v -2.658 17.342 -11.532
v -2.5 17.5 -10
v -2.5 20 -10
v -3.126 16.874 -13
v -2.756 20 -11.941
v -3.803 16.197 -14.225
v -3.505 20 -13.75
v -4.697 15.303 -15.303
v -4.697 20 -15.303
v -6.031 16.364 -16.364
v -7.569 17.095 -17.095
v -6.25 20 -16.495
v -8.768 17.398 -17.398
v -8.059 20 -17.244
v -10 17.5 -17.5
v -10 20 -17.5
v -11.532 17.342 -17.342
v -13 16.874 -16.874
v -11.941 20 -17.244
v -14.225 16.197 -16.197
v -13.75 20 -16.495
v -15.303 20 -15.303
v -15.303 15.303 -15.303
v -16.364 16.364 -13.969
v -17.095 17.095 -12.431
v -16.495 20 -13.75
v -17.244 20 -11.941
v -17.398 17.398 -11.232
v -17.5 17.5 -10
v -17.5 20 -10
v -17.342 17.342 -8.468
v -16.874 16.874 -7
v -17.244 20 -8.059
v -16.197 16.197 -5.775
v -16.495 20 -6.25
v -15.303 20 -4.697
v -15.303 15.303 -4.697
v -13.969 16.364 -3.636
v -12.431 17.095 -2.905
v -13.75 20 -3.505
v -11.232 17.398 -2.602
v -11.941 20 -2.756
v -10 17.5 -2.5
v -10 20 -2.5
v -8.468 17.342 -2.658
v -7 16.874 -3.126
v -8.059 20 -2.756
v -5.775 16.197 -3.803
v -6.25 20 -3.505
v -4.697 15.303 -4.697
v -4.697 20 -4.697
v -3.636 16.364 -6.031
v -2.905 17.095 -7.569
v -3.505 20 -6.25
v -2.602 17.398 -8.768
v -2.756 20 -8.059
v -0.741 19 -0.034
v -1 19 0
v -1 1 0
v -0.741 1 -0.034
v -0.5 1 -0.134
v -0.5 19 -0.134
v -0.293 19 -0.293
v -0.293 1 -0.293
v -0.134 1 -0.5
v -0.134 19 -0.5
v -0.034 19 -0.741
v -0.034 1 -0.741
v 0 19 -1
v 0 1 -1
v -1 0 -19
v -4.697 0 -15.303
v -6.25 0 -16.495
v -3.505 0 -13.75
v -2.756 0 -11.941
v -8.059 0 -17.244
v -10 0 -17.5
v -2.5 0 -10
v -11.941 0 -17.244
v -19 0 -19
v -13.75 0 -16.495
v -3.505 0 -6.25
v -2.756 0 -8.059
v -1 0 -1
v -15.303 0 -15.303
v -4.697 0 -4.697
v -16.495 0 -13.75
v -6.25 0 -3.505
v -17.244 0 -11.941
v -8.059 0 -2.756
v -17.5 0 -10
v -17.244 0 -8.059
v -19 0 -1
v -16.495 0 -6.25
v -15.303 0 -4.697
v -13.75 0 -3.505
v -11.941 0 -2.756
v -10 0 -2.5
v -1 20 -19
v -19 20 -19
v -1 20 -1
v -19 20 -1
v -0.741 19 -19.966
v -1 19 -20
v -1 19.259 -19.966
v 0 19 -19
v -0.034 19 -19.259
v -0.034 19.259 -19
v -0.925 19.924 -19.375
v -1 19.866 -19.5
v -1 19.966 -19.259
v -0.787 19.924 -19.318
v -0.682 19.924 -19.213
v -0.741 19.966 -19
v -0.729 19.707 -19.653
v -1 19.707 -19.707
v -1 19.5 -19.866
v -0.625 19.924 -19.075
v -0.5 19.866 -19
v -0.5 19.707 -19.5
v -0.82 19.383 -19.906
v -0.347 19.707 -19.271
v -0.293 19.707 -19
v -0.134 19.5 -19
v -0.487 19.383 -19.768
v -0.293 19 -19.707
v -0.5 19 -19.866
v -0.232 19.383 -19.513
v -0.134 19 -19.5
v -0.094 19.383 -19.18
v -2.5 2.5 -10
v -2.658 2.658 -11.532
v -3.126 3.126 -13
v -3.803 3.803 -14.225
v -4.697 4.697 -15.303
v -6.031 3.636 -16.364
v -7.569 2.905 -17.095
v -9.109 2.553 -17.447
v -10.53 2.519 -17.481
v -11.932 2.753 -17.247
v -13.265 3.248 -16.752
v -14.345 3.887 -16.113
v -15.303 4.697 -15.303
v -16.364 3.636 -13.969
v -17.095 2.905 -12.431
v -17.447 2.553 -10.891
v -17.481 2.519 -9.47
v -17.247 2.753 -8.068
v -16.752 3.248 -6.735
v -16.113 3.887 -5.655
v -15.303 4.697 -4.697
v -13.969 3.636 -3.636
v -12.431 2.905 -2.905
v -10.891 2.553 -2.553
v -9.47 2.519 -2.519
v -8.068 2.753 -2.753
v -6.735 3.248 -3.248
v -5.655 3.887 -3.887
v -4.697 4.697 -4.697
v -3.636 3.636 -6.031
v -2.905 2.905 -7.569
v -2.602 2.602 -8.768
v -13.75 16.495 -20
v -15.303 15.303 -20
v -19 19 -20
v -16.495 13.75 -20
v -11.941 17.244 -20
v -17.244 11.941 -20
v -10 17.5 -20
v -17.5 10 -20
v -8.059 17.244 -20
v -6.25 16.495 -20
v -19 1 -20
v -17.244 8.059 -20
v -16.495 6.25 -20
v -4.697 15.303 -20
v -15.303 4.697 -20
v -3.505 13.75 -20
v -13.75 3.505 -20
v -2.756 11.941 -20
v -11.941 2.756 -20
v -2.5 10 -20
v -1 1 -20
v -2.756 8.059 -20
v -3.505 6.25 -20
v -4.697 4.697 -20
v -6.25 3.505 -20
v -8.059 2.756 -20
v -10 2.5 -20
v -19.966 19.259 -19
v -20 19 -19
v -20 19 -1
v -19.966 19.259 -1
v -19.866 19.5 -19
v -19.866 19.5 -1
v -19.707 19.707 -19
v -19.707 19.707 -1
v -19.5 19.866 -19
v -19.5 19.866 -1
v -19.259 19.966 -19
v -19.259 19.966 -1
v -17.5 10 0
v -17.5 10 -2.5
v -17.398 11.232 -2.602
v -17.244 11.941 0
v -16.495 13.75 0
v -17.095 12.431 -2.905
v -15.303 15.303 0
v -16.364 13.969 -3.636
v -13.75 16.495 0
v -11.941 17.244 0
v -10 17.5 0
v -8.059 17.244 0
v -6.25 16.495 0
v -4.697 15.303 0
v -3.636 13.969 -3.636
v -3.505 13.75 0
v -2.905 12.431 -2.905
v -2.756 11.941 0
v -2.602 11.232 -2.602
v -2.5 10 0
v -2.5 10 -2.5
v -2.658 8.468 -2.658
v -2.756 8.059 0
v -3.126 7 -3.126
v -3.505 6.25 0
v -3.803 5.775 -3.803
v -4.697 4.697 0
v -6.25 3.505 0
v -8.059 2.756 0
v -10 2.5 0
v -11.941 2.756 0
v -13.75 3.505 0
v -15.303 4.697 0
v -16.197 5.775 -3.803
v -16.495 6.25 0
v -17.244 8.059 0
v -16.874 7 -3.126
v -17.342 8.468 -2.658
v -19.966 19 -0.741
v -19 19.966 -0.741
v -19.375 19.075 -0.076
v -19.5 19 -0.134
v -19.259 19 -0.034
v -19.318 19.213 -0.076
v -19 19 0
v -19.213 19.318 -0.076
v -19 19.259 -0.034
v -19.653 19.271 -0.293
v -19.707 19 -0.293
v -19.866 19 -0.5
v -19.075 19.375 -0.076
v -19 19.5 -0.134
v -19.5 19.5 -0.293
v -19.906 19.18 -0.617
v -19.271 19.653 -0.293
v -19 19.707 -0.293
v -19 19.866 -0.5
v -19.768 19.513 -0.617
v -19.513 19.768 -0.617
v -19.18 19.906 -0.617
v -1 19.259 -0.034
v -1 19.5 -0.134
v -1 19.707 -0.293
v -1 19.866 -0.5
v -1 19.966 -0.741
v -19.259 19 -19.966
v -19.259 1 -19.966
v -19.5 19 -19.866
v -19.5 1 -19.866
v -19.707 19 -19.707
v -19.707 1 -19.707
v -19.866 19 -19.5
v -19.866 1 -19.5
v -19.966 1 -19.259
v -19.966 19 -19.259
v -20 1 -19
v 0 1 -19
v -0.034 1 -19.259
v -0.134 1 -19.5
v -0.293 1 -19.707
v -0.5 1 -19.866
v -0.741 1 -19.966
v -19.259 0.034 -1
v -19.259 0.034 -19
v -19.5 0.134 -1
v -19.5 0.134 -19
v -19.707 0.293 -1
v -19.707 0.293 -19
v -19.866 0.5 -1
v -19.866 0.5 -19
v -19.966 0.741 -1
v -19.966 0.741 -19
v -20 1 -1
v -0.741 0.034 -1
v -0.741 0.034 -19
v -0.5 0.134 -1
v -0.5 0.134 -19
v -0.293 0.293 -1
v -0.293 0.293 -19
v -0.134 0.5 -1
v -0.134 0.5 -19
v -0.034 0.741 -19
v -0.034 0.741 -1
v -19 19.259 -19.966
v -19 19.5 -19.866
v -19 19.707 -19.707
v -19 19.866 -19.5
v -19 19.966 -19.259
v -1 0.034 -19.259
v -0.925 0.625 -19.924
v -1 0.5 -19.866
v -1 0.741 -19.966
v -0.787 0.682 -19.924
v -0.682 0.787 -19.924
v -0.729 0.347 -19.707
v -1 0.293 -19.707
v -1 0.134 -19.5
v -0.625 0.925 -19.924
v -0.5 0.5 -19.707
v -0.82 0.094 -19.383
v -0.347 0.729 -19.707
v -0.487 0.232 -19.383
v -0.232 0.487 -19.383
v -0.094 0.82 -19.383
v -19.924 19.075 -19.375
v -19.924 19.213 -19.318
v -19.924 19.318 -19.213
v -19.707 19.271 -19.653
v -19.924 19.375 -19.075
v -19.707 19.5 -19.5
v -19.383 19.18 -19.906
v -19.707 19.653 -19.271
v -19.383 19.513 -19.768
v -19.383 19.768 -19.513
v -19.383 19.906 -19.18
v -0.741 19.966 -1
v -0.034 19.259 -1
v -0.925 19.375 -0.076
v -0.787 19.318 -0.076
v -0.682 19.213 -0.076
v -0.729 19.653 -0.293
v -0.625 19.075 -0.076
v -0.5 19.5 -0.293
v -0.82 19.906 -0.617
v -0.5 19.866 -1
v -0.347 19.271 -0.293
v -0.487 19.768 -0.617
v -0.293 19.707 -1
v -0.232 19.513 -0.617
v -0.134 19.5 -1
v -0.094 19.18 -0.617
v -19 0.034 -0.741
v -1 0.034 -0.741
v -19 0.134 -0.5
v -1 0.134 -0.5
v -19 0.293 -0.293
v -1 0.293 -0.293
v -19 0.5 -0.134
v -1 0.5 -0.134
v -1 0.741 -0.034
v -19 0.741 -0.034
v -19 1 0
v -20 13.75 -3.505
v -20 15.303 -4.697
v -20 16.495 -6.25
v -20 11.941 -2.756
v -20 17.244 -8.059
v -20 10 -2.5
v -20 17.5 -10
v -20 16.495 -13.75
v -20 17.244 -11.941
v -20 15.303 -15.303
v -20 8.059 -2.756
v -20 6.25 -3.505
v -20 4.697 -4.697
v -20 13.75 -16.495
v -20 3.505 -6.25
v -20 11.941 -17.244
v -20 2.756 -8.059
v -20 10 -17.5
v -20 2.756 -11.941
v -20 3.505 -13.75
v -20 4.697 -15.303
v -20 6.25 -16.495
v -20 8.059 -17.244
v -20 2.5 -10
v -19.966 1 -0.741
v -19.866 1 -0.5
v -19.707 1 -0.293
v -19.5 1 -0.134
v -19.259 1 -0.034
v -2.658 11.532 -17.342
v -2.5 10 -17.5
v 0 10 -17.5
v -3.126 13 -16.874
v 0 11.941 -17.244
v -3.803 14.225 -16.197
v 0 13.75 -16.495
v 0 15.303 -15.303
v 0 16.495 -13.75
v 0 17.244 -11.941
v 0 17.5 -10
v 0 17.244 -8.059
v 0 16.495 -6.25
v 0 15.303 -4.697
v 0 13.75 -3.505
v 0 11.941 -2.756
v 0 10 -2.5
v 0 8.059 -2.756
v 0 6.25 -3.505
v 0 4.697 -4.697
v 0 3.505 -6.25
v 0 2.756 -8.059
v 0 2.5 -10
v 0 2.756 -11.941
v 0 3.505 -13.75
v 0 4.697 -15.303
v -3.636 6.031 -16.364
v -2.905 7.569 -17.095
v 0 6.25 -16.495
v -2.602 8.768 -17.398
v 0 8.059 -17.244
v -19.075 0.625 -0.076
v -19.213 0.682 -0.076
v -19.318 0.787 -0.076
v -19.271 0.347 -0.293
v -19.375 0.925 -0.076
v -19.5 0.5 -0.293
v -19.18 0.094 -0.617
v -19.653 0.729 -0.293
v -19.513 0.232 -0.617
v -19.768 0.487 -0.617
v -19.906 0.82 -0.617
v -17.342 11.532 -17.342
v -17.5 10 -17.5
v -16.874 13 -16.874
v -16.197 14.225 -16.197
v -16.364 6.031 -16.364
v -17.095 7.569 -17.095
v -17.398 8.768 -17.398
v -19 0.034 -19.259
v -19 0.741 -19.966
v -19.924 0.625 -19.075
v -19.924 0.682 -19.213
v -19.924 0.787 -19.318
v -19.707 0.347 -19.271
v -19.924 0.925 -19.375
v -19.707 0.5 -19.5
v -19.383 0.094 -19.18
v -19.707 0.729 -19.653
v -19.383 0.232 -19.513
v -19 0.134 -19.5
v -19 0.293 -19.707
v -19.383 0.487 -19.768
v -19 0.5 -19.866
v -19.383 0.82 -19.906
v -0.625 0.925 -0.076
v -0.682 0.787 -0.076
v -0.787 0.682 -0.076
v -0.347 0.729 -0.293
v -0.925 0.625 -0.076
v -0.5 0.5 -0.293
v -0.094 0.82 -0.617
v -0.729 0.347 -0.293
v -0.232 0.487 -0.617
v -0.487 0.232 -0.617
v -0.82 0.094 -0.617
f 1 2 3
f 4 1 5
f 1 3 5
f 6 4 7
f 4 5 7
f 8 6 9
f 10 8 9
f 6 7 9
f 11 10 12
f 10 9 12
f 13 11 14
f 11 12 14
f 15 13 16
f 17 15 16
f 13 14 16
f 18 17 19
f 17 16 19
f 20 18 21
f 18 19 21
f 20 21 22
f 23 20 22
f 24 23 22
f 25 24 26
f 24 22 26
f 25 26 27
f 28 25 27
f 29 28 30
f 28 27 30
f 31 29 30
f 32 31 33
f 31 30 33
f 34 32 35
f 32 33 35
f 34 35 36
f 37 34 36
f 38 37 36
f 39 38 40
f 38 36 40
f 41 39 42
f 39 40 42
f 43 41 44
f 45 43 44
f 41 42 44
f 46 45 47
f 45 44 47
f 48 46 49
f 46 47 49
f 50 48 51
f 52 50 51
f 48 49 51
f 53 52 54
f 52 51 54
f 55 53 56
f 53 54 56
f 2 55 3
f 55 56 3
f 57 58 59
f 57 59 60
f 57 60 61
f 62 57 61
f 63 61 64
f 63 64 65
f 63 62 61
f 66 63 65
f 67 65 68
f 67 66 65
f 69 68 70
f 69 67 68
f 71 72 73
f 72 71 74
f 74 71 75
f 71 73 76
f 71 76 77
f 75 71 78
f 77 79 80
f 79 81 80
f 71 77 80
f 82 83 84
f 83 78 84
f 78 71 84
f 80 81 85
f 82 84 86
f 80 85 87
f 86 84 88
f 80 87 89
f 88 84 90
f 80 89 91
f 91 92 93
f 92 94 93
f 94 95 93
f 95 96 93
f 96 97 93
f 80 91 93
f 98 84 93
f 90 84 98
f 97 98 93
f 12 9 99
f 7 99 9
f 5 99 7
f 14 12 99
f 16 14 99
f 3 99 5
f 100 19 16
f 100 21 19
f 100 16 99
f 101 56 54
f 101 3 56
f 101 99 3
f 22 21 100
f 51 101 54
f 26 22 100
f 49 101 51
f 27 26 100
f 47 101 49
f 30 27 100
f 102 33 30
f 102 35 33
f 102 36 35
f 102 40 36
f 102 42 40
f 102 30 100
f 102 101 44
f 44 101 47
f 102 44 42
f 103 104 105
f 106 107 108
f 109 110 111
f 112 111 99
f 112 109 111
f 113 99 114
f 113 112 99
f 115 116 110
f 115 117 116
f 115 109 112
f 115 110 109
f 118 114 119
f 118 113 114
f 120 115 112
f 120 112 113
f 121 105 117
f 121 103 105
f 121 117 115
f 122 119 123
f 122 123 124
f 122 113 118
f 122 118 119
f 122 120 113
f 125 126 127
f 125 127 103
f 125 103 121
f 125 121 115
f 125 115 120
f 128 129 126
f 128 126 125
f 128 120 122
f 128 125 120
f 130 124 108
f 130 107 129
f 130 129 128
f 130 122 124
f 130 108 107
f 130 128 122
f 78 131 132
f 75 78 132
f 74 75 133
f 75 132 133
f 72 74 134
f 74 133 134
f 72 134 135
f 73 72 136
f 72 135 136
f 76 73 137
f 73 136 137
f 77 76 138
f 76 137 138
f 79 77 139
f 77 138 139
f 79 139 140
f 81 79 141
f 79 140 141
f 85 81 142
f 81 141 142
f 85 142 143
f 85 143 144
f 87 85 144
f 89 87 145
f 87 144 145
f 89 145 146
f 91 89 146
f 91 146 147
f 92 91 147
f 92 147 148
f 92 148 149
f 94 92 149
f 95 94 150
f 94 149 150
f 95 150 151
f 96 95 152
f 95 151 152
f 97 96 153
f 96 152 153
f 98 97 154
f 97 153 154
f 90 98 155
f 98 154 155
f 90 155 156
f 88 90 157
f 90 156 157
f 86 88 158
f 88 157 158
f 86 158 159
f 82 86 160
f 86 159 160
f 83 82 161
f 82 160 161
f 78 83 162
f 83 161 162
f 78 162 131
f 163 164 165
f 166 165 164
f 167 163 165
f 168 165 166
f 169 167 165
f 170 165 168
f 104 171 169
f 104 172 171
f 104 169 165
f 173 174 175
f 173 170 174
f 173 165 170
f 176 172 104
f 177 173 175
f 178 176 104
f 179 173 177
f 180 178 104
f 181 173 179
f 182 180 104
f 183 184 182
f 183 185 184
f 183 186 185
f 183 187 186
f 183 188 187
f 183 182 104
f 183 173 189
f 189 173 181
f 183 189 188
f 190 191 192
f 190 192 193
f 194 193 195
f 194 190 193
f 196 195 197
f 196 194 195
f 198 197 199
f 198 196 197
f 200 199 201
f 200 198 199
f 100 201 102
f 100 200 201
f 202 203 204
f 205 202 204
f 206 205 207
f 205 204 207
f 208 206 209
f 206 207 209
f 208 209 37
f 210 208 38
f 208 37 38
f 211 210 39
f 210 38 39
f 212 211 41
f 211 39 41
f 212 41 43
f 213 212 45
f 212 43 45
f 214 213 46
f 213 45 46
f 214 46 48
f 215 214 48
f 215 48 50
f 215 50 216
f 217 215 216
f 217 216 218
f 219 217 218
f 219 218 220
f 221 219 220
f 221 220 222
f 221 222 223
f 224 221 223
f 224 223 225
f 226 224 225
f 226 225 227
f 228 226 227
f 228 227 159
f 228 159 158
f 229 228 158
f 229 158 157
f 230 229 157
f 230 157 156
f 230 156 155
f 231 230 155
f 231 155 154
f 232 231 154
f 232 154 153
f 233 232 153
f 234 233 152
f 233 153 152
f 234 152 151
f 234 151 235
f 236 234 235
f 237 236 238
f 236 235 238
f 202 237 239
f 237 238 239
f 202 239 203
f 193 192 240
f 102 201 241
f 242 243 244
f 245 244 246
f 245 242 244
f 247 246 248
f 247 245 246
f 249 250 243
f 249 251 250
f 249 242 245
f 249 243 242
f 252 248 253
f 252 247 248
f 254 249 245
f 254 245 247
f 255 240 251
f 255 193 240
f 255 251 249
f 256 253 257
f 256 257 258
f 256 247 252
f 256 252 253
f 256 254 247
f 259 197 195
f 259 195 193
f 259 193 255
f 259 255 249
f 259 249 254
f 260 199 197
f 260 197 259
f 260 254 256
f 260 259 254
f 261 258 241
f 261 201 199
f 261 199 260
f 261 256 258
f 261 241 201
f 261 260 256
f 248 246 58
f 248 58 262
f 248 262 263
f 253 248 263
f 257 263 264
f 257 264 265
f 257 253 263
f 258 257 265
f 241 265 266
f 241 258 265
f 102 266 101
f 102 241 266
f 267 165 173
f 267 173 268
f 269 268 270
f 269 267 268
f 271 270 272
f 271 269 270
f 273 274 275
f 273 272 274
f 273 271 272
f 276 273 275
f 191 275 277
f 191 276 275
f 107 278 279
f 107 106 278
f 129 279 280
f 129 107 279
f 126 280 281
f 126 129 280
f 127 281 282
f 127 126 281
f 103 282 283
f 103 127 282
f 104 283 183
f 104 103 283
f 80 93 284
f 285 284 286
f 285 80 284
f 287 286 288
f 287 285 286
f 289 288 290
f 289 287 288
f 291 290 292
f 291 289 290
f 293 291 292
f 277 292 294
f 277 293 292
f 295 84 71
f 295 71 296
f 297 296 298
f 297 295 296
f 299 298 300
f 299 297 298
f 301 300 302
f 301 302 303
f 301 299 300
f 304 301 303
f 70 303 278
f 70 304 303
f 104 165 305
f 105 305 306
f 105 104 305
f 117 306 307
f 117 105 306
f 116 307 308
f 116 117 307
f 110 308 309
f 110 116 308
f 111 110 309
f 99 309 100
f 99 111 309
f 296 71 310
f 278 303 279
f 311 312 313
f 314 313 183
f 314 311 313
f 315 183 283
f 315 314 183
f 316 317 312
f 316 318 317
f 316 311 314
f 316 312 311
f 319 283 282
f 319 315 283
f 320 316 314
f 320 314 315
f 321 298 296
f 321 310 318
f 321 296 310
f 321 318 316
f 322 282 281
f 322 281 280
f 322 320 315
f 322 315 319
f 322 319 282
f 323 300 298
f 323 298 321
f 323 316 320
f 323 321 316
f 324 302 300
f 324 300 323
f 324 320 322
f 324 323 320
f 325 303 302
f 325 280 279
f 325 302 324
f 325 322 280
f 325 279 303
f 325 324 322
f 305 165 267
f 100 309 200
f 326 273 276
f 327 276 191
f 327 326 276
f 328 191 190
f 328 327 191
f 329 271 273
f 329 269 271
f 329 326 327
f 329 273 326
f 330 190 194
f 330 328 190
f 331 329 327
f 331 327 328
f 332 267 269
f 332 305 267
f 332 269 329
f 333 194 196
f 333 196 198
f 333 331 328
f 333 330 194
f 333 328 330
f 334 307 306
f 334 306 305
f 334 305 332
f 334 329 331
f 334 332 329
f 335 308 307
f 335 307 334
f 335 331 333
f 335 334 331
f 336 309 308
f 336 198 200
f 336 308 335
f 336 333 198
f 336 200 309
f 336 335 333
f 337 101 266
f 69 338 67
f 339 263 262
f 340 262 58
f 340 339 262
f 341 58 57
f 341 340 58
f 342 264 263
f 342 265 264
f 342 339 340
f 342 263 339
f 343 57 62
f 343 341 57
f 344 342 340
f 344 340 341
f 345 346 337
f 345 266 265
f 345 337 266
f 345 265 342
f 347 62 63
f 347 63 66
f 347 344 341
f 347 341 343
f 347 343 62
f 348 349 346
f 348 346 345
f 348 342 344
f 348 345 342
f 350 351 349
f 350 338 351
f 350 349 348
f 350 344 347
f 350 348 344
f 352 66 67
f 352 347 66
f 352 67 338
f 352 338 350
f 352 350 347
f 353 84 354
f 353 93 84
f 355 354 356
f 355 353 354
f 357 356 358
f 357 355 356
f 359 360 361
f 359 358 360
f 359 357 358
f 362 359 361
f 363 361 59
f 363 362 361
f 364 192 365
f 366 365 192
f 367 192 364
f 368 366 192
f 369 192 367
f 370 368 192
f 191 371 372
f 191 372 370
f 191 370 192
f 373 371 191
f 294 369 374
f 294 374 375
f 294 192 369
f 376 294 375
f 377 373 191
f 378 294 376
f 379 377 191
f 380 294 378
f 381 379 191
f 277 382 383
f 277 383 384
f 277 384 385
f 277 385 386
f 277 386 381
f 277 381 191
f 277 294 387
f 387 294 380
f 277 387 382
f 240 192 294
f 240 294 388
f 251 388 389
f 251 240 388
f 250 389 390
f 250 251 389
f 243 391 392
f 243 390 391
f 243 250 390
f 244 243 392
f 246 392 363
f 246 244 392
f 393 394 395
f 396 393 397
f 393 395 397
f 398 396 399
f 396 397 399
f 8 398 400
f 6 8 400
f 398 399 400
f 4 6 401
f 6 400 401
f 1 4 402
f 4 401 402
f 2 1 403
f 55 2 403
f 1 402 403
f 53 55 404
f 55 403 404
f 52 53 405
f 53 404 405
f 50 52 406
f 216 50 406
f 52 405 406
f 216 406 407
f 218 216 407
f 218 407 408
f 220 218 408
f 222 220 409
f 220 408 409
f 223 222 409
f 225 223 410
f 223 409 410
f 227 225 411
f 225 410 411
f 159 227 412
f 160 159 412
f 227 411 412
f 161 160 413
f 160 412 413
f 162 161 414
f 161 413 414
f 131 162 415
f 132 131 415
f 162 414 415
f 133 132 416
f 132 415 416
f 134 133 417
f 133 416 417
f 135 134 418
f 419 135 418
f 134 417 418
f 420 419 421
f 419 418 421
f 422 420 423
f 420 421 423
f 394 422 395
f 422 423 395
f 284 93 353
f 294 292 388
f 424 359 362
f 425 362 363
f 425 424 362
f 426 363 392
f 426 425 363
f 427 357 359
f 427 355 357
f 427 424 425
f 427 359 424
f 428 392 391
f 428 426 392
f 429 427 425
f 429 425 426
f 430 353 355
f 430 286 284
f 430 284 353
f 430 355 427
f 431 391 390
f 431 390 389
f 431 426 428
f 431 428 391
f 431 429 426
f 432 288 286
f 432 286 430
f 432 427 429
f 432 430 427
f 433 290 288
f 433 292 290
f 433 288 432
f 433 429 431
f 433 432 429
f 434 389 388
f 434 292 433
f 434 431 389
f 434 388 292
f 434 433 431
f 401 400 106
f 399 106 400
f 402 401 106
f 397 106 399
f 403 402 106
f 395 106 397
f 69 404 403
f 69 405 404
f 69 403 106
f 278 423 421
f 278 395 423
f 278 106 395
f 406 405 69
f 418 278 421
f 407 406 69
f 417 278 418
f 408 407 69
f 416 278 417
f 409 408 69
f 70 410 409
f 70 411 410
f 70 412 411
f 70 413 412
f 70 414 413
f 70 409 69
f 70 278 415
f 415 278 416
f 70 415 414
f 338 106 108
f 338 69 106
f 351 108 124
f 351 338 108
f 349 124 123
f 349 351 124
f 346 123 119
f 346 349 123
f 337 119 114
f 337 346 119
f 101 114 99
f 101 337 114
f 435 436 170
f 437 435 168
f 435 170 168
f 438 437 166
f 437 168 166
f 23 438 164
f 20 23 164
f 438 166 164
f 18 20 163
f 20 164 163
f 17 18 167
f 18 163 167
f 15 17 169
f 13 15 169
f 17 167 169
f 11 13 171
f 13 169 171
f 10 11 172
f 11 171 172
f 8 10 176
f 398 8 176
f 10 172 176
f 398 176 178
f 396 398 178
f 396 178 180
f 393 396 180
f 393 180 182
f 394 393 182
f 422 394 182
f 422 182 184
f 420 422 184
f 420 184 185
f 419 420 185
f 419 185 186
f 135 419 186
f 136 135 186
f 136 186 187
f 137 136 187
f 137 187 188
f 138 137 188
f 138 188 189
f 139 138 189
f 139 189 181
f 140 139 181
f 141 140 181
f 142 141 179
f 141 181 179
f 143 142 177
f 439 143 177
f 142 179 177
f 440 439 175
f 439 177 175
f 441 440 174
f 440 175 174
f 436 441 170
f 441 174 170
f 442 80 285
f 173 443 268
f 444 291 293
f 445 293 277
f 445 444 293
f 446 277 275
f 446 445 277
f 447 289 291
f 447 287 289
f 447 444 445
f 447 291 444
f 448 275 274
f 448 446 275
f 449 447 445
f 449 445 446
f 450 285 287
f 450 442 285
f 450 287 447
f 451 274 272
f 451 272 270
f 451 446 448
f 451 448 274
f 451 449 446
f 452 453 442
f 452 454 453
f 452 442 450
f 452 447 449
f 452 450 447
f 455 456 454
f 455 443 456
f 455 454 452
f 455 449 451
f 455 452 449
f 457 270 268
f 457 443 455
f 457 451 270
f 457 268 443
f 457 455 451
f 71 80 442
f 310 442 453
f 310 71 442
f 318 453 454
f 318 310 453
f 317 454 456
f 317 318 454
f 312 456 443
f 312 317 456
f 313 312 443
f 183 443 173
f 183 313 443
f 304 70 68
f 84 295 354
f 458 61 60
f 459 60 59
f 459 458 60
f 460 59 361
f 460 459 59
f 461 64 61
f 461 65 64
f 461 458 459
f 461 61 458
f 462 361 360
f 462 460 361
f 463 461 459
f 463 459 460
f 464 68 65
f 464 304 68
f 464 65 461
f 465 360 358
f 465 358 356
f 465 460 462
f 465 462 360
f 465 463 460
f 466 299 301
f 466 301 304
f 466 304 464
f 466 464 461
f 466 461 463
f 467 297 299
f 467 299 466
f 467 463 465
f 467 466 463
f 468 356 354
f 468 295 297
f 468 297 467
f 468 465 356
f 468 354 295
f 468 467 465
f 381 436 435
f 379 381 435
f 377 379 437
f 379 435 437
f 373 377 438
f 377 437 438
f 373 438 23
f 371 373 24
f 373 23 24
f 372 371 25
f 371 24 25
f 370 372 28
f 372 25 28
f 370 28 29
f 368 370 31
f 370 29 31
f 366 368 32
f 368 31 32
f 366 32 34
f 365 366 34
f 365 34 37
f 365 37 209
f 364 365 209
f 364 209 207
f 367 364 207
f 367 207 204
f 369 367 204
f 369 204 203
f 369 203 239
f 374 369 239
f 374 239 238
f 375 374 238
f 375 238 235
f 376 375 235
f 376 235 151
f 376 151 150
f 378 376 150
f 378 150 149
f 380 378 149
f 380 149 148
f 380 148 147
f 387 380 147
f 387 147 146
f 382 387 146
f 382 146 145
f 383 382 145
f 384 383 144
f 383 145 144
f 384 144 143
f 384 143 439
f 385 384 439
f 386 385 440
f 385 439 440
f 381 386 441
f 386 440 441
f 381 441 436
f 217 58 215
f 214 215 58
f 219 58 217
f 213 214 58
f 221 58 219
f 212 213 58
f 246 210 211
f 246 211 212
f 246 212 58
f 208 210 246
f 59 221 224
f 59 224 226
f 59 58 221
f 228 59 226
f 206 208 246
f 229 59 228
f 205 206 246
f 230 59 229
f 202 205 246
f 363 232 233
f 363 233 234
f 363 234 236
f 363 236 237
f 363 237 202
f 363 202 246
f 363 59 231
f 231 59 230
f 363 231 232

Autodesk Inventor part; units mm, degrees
ref_plane "YZ Plane" through (0, 0, 0) normal (1, 0, 0) x (0, 1, 0)
ref_plane "XZ Plane" through (0, 0, 0) normal (0, 1, 0) x (-1, 0, 0)
ref_plane "XY Plane" through (0, 0, 0) normal (0, 0, 1) x (1, 0, 0)
sketch "Эскиз1" plane through (0, 0, 0) normal (0, 1, 0) x (-1, 0, 0)
  line L0 (0, 0) -> (20, 0)
  line L1 (20, 0) -> (20, -20)
  line L2 (20, -20) -> (0, -20)
  line L3 (0, -20) -> (0, 0)
  dimension "d0" = 20
  dimension "d1" = 20
extrude "Выдавливание1" add sketch "Эскиз1" along normal blind 20
sketch "Эскиз2" plane through (0, 20, 0) normal (0, 1, 0) x (1, 0, 0)
  circle A0 centre (-10, 10) radius 7.5
  line L0 (0, 0) -> (0, 20) projected
  dimension "d4" = 15
  dimension "d5" = 10
  dimension "d6" = 10
sketch "Эскиз3" plane through (0, 0, -20) normal (0, 0, -1) x (-1, 0, 0)
  circle A0 centre (10, 10) radius 7.5
  line L0 (0, 0) -> (0, 20) projected
  line L1 (0, 0) -> (20, 0) projected
  dimension "d7" = 15
  dimension "d8" = 10
  dimension "d9" = 10
sketch "Эскиз4" plane through (0, 0, 0) normal (1, 0, 0) x (0, 0, -1)
  circle A0 centre (10, 10) radius 7.5
  line L0 (20, 0) -> (20, 20) projected
  line L1 (0, 20) -> (20, 20) projected
  point P0 (0, 0)
  dimension "d10" = 15
  dimension "d11" = 10
  dimension "d12" = 10
extrude "Выдавливание2" cut sketch "Эскиз2" against normal blind 20
extrude "Выдавливание3" cut sketch "Эскиз4" against normal blind 20
extrude "Выдавливание4" cut sketch "Эскиз3" against normal blind 20
fillet "Сопряжение1" radius 1 12 edges at (0, 0, -10) (-10, 0, -20) (0, 10, -20) (0, 20, -10) (-10, 20, -20) (-20, 20, -10) (-20, 0, -10) (-10, 0, 0) (-10, 20, 0) (0, 10, 0) (-20, 10, 0) (-20, 10, -20)
properties part number "КубСоединительный2020"
